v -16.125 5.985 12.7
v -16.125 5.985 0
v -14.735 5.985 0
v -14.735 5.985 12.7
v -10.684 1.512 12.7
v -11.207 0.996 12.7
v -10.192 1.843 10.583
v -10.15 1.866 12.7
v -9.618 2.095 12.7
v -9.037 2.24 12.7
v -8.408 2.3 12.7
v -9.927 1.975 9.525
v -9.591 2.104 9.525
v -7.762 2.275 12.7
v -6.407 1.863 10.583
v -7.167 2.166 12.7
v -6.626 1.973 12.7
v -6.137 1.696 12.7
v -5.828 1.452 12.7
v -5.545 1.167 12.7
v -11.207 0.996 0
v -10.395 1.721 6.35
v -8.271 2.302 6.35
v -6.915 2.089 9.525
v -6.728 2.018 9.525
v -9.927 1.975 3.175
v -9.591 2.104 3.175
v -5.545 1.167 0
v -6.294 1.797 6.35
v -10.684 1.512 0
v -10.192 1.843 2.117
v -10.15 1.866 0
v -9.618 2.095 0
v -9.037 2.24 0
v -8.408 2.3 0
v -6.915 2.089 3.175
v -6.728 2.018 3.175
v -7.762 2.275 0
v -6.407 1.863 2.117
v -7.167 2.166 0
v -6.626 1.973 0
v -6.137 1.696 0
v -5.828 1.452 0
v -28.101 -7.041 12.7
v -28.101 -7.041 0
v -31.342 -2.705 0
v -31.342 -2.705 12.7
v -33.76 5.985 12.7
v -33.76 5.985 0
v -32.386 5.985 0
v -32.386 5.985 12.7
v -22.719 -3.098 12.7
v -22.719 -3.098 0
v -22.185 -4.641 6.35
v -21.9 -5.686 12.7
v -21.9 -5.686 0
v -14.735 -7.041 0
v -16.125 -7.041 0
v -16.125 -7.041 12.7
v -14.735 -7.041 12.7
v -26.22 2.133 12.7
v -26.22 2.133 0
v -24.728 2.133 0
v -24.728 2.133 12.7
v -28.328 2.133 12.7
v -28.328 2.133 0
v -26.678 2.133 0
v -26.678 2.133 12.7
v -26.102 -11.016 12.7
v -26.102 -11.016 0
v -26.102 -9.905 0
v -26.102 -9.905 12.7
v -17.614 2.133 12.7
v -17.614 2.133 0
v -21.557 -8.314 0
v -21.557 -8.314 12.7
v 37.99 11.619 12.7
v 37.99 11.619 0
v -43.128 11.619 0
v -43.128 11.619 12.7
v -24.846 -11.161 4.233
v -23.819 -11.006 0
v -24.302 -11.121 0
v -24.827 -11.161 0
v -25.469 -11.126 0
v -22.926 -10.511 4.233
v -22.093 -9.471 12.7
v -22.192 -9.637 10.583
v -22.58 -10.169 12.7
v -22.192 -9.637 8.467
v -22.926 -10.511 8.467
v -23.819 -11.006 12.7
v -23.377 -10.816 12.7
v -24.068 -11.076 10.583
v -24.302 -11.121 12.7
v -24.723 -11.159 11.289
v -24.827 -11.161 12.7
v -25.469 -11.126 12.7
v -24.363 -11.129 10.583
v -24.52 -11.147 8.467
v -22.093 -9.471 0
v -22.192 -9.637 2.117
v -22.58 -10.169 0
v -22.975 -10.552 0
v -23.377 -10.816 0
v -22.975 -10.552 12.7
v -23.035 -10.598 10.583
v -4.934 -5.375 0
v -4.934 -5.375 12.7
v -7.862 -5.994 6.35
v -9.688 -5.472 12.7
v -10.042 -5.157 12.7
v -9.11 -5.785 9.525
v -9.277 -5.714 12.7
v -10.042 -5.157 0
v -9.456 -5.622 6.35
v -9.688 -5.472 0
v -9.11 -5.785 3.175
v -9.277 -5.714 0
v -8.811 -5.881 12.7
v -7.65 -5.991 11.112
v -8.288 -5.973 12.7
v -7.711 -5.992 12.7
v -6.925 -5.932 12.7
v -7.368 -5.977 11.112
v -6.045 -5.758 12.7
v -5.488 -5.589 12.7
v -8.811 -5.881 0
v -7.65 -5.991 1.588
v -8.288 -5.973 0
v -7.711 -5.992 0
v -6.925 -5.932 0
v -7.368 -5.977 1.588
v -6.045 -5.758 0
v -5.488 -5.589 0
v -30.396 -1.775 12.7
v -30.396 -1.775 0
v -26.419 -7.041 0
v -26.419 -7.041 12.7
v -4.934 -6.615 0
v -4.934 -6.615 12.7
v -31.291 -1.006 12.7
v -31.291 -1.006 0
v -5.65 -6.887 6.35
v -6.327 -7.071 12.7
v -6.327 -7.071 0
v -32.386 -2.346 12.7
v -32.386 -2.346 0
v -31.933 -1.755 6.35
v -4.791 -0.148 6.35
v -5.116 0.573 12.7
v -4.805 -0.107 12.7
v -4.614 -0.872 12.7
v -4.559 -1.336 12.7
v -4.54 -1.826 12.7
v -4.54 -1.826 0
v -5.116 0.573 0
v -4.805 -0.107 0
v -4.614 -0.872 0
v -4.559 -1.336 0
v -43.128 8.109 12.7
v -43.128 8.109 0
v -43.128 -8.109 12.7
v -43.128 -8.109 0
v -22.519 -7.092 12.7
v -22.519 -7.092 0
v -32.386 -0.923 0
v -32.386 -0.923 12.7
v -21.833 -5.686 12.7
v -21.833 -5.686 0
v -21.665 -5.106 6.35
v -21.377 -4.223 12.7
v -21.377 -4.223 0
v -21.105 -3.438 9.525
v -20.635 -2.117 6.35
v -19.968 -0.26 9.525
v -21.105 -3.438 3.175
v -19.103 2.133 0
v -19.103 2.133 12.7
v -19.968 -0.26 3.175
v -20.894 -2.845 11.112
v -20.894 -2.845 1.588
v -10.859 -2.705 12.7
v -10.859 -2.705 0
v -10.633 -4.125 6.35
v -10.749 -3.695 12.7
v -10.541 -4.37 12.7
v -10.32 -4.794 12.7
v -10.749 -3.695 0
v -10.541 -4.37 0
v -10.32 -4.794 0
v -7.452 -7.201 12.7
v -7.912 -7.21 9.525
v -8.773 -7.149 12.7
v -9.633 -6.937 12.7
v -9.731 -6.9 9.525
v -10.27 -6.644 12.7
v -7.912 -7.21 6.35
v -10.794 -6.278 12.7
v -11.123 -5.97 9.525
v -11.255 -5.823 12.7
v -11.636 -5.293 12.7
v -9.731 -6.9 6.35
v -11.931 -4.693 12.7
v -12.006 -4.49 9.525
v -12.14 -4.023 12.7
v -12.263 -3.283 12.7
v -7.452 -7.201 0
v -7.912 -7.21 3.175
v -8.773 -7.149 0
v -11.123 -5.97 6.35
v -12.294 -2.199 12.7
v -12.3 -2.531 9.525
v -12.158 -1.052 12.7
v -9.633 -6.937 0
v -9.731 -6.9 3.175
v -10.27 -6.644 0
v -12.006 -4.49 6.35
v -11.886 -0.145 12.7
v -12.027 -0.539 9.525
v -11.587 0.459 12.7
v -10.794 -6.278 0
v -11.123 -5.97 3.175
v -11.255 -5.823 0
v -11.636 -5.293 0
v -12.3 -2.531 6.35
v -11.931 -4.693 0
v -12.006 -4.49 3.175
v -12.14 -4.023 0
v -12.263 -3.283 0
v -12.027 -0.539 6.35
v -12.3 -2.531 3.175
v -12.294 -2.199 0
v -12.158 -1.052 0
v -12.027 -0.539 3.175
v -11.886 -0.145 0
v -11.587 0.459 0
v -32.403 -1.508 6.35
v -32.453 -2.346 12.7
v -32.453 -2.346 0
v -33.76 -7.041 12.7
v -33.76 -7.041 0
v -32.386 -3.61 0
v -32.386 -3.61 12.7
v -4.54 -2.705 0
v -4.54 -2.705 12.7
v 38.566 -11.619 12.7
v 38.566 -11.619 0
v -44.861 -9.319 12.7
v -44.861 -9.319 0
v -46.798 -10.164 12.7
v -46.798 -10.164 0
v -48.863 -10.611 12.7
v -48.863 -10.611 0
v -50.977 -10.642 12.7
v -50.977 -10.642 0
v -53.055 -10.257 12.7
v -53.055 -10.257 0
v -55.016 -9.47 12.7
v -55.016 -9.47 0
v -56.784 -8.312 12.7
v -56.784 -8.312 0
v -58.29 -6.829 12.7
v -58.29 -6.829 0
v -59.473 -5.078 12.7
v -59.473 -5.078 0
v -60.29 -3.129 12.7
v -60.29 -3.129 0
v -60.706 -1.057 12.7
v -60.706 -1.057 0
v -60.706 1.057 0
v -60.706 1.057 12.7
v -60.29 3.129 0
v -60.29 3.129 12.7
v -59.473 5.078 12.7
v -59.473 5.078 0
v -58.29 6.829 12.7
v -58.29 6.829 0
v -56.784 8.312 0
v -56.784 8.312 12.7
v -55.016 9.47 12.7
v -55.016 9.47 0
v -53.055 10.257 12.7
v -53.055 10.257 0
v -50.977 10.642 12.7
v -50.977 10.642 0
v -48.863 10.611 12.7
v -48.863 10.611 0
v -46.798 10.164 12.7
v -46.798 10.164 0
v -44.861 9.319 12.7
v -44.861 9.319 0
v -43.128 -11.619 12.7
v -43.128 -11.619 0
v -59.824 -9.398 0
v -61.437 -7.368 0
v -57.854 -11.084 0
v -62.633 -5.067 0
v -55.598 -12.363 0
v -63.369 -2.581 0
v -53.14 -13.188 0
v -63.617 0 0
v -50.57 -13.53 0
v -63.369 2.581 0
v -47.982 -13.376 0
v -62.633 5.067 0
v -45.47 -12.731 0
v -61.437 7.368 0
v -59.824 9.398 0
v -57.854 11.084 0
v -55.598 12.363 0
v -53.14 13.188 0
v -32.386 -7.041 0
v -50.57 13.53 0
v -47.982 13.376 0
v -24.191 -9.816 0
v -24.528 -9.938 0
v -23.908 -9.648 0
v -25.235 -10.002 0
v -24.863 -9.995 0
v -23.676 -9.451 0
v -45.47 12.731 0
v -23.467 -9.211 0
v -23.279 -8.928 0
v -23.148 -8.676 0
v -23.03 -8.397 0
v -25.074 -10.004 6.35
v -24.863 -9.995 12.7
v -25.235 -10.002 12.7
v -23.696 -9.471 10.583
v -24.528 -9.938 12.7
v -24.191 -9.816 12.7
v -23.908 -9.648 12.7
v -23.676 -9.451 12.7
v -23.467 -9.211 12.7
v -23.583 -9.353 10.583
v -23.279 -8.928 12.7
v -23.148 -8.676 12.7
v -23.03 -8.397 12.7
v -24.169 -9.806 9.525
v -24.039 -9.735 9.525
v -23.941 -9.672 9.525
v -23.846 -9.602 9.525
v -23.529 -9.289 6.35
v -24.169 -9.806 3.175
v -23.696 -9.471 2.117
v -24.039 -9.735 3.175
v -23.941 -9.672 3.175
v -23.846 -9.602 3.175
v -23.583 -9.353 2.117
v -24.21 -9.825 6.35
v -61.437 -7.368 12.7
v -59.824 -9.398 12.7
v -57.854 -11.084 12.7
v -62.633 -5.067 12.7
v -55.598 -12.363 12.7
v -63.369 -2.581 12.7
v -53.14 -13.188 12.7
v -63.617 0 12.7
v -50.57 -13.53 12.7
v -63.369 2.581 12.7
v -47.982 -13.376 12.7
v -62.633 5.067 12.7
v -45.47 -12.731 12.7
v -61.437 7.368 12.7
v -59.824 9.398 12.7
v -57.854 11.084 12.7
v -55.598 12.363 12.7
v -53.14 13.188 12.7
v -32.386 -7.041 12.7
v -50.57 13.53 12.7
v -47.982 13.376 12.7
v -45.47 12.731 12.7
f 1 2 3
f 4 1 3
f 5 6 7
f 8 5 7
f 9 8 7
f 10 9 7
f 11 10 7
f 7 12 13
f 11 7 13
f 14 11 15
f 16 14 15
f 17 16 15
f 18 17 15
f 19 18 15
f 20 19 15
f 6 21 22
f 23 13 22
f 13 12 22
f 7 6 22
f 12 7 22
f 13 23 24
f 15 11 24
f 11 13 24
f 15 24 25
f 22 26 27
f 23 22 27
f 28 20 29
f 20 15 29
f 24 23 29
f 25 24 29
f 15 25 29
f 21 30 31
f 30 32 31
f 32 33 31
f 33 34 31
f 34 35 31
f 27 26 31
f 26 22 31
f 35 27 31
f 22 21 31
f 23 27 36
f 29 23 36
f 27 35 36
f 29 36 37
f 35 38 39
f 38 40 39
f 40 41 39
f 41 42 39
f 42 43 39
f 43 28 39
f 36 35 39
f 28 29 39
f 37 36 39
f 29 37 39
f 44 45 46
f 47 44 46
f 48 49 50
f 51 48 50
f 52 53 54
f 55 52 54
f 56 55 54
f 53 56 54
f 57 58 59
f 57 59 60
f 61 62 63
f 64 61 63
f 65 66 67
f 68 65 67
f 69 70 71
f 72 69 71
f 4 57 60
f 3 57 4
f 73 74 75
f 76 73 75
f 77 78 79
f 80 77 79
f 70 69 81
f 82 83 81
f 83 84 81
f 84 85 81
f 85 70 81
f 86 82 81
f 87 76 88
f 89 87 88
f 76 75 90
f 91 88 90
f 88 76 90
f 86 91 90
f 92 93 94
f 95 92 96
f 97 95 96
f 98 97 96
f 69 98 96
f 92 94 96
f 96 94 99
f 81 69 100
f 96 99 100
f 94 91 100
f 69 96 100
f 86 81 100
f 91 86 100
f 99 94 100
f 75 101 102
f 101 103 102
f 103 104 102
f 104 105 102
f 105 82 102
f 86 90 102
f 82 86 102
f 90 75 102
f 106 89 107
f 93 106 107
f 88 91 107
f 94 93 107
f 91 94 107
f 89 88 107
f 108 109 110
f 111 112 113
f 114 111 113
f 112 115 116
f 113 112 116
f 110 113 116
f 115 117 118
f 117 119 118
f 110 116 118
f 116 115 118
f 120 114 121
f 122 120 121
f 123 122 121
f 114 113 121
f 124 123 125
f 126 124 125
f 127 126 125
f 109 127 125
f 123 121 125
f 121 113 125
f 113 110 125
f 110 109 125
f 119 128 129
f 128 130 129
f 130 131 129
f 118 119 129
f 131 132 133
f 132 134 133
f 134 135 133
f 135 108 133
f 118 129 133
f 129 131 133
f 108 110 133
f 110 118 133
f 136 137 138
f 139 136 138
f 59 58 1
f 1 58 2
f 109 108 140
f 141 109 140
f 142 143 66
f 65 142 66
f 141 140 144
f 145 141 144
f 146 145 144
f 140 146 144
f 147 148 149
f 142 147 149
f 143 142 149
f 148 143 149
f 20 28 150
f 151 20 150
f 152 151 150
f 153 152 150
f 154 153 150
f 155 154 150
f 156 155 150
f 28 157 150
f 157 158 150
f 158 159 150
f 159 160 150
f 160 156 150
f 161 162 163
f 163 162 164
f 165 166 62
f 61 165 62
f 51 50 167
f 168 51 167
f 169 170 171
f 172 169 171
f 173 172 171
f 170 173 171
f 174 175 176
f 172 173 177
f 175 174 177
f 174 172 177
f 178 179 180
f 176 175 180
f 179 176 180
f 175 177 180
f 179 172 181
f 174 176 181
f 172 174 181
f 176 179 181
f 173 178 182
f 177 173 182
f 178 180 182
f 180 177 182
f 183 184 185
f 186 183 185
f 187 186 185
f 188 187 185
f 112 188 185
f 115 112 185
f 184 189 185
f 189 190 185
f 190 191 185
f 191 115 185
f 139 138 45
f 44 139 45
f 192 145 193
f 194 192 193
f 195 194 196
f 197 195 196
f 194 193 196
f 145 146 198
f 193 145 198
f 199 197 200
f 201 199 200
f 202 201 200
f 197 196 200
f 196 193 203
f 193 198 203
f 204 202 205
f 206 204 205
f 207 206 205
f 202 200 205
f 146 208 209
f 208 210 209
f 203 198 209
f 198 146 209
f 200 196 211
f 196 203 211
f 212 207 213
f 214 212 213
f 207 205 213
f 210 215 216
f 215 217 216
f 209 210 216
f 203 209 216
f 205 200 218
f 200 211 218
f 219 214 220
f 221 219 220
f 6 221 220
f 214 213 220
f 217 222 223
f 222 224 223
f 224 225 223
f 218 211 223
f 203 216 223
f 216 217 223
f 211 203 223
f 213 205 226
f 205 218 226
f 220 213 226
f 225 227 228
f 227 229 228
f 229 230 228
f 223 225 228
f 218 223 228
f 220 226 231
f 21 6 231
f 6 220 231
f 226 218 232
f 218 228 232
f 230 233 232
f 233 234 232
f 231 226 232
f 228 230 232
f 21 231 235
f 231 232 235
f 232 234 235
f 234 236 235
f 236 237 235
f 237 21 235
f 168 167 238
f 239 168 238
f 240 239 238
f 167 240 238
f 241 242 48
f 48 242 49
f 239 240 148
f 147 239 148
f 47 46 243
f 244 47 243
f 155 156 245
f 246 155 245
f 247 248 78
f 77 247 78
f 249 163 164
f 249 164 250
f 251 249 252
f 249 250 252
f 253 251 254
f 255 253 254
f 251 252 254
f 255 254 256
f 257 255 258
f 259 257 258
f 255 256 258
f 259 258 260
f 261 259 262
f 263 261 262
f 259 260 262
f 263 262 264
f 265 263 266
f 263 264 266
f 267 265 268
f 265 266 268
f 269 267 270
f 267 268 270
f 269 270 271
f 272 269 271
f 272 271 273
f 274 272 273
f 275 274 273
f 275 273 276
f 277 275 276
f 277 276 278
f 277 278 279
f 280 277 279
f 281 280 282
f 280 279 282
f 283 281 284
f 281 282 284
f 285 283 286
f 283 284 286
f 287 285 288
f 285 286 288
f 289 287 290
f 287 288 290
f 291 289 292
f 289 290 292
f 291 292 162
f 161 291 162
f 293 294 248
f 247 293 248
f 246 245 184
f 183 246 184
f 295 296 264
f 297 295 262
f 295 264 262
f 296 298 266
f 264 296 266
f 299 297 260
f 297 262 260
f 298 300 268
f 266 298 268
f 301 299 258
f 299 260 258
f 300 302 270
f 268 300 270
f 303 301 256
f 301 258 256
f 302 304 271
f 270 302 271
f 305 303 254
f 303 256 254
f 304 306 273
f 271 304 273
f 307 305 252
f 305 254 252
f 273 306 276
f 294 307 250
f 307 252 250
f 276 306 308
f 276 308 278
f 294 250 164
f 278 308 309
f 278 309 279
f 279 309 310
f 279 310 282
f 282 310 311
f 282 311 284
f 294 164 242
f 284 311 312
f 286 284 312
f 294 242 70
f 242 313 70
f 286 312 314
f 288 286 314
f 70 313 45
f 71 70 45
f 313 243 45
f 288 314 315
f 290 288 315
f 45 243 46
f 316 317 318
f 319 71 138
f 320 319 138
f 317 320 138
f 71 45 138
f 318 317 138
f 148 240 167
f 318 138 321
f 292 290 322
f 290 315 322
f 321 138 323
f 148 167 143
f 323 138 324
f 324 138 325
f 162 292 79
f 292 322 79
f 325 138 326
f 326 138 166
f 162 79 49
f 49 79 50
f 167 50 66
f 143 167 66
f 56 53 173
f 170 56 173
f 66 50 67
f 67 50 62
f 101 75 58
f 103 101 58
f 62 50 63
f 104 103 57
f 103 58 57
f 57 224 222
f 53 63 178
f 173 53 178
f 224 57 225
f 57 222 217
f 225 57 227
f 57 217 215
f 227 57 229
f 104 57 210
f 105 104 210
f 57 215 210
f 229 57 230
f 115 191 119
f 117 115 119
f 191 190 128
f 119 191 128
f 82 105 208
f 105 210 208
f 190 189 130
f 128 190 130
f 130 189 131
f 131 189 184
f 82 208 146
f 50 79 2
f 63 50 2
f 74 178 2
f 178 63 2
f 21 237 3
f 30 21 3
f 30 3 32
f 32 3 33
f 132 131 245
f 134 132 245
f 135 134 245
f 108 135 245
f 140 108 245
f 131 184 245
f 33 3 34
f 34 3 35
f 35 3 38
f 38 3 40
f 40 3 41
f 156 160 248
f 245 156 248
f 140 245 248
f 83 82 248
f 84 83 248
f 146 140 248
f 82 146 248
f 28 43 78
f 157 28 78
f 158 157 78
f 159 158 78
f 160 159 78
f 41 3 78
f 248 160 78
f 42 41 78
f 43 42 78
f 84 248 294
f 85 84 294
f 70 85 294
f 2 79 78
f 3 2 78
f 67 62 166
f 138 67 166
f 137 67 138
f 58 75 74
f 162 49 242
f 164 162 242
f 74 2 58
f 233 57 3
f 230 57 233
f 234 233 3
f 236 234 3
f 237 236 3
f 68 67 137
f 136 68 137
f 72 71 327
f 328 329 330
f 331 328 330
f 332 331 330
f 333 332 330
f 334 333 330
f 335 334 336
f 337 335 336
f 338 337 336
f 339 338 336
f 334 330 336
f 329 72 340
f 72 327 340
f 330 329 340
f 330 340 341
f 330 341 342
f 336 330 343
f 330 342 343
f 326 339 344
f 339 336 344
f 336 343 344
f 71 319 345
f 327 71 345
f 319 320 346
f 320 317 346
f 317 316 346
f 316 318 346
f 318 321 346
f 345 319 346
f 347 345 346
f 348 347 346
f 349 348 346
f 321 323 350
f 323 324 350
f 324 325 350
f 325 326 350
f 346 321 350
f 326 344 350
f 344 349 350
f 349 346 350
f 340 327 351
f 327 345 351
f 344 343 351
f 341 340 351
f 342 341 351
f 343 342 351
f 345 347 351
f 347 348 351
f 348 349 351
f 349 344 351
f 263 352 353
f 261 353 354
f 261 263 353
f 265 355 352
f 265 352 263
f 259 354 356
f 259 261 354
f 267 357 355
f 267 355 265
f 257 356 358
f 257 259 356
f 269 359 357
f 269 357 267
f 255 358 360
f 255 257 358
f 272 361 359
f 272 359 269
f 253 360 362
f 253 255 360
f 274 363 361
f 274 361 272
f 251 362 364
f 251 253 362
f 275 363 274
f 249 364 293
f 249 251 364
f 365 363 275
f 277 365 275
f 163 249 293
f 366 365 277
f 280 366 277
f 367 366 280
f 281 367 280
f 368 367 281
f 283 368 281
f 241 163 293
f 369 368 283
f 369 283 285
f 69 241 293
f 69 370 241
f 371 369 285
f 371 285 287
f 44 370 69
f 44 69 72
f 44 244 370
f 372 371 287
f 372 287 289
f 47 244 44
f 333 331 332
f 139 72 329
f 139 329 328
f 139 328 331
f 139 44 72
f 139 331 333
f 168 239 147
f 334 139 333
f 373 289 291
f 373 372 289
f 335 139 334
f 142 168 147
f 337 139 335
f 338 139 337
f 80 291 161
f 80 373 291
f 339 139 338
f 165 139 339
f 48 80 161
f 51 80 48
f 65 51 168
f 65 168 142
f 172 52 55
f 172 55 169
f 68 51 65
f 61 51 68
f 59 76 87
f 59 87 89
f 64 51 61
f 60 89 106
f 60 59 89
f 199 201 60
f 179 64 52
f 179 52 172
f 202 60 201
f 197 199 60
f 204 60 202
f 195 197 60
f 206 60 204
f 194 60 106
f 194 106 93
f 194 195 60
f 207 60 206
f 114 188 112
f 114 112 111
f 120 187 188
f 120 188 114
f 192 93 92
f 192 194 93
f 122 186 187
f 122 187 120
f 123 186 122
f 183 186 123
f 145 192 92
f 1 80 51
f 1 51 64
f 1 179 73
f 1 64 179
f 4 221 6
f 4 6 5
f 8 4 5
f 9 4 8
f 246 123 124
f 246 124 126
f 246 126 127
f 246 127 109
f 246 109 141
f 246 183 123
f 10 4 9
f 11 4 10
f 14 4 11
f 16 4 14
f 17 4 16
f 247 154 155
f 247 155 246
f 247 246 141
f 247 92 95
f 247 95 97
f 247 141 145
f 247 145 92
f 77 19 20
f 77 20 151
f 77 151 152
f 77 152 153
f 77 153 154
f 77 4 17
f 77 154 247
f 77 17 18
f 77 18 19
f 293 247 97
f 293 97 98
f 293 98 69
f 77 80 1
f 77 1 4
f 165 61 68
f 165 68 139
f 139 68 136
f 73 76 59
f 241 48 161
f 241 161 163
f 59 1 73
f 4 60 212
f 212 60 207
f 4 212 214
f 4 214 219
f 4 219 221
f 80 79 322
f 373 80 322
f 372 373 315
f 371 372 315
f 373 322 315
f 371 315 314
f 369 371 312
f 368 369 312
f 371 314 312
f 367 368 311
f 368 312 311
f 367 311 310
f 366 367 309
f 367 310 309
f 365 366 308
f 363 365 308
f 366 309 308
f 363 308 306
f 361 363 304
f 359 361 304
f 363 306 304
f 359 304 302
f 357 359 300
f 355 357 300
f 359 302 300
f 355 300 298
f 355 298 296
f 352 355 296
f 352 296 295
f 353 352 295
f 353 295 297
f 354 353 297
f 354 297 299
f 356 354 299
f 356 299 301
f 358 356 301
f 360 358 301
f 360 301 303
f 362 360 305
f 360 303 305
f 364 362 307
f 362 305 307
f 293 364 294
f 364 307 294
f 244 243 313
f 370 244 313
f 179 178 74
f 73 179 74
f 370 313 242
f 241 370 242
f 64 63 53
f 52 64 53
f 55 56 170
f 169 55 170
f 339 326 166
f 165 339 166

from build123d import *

# Parameters (mm, degrees)
F0_W     = 1.390167144
F0_H     = 13.0257857824
F1_DEPTH = 12.7


with BuildPart() as f1:
    # F0 (on Top) → F1 (new body)
    with BuildSketch(Plane.XY):
        with BuildLine():
            Line((-43.1278555505, 8.1087965258), (-43.1278555505, 11.6189617885))
            ThreePointArc((-43.1278555505, 11.6189617885), (-63.6173153539, 0), (-43.1278555505, -11.6189617885))
            Line((-43.1278555505, -11.6189617885), (-43.1278555505, -8.1087965258))
            ThreePointArc((-43.1278555505, -8.1087965258), (-60.7580848758, 0), (-43.1278555505, 8.1087965258))
        make_face()
        Polygon((37.9903619809, 11.6189617885), (-43.1278555505, 11.6189617885), (-43.1278555505, 8.1087965258), (-43.1278555505, -8.1087965258), (-43.1278555505, -11.6189617885), (38.5659746826, -11.6189617885), align=None)
        with BuildLine():
            Line((-22.5185390528, -7.0921576955), (-26.2202943379, 2.1327664737))
            Line((-26.2202943379, 2.1327664737), (-24.7283423163, 2.1327664737))
            Line((-24.7283423163, 2.1327664737), (-22.7194302586, -3.0984405247))
            add(Edge.make_bspline(
                [(-22.7194302586, -3.0984405247), (-22.0605071037, -4.8903900802), (-21.899794139, -5.6859192551)],
                knots=[0, 0, 0, 1, 1, 1], degree=2))
            Line((-21.899794139, -5.6859192551), (-21.8328304038, -5.6859192551))
            add(Edge.make_bspline(
                [(-21.8328304038, -5.6859192551), (-21.7256884274, -5.2573513494), (-21.377477004, -4.223431277)],
                knots=[0, 0, 0, 1, 1, 1], degree=2))
            add(Edge.make_bspline(
                [(-21.377477004, -4.223431277), (-21.0292655807, -3.1895112047), (-19.1033885547, 2.1327664737)],
                knots=[0, 0, 0, 1, 1, 1], degree=2))
            Line((-19.1033885547, 2.1327664737), (-17.6141150825, 2.1327664737))
            Line((-17.6141150825, 2.1327664737), (-21.5569398145, -8.3135762266))
            add(Edge.make_bspline(
                [(-21.5569398145, -8.3135762266), (-22.1435421354, -9.8617777858), (-22.9256785632, -10.5113260178)],
                knots=[0, 0, 0, 1, 1, 1], degree=2))
            add(Edge.make_bspline(
                [(-22.9256785632, -10.5113260178), (-23.707814991, -11.1608742498), (-24.8461984904, -11.1608742498)],
                knots=[0, 0, 0, 1, 1, 1], degree=2))
            add(Edge.make_bspline(
                [(-24.8461984904, -11.1608742498), (-25.4836932501, -11.1608742498), (-26.1024381638, -11.0162325816)],
                knots=[0, 0, 0, 1, 1, 1], degree=2))
            Line((-26.1024381638, -11.0162325816), (-26.1024381638, -9.9046345763))
            add(Edge.make_bspline(
                [(-26.1024381638, -9.9046345763), (-25.6417276653, -10.0037409045), (-25.0738751903, -10.0037409045)],
                knots=[0, 0, 0, 1, 1, 1], degree=2))
            add(Edge.make_bspline(
                [(-25.0738751903, -10.0037409045), (-23.6408512558, -10.0037409045), (-23.0301419902, -8.3966112583)],
                knots=[0, 0, 0, 1, 1, 1], degree=2))
            Line((-23.0301419902, -8.3966112583), (-22.5185390528, -7.0921576955))
        make_face(mode=Mode.SUBTRACT)
        with BuildLine():
            Line((-32.4532788157, -2.3457681404), (-32.3863150805, -2.3457681404))
            add(Edge.make_bspline(
                [(-32.3863150805, -2.3457681404), (-32.0273894595, -1.834165203), (-31.2907883716, -1.0064934352)],
                knots=[0, 0, 0, 1, 1, 1], degree=2))
            Line((-31.2907883716, -1.0064934352), (-28.3283127238, 2.1327664737))
            Line((-28.3283127238, 2.1327664737), (-26.6783262871, 2.1327664737))
            Line((-26.6783262871, 2.1327664737), (-30.3961528686, -1.775237116))
            Line((-30.3961528686, -1.775237116), (-26.4185069943, -7.0412652567))
            Line((-26.4185069943, -7.0412652567), (-28.1006360239, -7.0412652567))
            Line((-28.1006360239, -7.0412652567), (-31.3416808104, -2.7046937614))
            Line((-31.3416808104, -2.7046937614), (-32.3863150805, -3.6100434621))
            Line((-32.3863150805, -3.6100434621), (-32.3863150805, -7.0412652567))
            Line((-32.3863150805, -7.0412652567), (-33.760410928, -7.0412652567))
            Line((-33.760410928, -7.0412652567), (-33.760410928, 5.9845205257))
            Line((-33.760410928, 5.9845205257), (-32.3863150805, 5.9845205257))
            Line((-32.3863150805, 5.9845205257), (-32.3863150805, -0.9234584035))
            add(Edge.make_bspline(
                [(-32.3863150805, -0.9234584035), (-32.3863150805, -1.3814903527), (-32.4532788157, -2.3457681404)],
                knots=[0, 0, 0, 1, 1, 1], degree=2))
        make_face(mode=Mode.SUBTRACT)
        with Locations((-15.4297580384, -0.5283723655)):
            Rectangle(F0_W, F0_H, mode=Mode.SUBTRACT)
        with BuildLine():
            add(Edge.make_bspline(
                [(-6.3267078674, -7.0707293002), (-6.982952473, -7.2100138696), (-7.9124091183, -7.2100138696)],
                knots=[0, 0, 0, 1, 1, 1], degree=2))
            add(Edge.make_bspline(
                [(-7.9124091183, -7.2100138696), (-9.9454281208, -7.2100138696), (-11.1226505866, -5.9698454926)],
                knots=[0, 0, 0, 1, 1, 1], degree=2))
            add(Edge.make_bspline(
                [(-11.1226505866, -5.9698454926), (-12.2998730524, -4.7296771156), (-12.2998730524, -2.5305880497)],
                knots=[0, 0, 0, 1, 1, 1], degree=2))
            add(Edge.make_bspline(
                [(-12.2998730524, -2.5305880497), (-12.2998730524, -0.3100705886), (-11.207024893, 0.995722249)],
                knots=[0, 0, 0, 1, 1, 1], degree=2))
            add(Edge.make_bspline(
                [(-11.207024893, 0.995722249), (-10.1141767336, 2.3015150865), (-8.2713347393, 2.3015150865)],
                knots=[0, 0, 0, 1, 1, 1], degree=2))
            add(Edge.make_bspline(
                [(-8.2713347393, 2.3015150865), (-6.5490274685, 2.3015150865), (-5.5445714396, 1.1671494112)],
                knots=[0, 0, 0, 1, 1, 1], degree=2))
            add(Edge.make_bspline(
                [(-5.5445714396, 1.1671494112), (-4.5401154107, 0.032783736), (-4.5401154107, -1.8261295548)],
                knots=[0, 0, 0, 1, 1, 1], degree=2))
            Line((-4.5401154107, -1.8261295548), (-4.5401154107, -2.7046937614))
            Line((-4.5401154107, -2.7046937614), (-10.8588134697, -2.7046937614))
            add(Edge.make_bspline(
                [(-10.8588134697, -2.7046937614), (-10.8159566791, -4.3198590558), (-10.0418558995, -5.1569057465)],
                knots=[0, 0, 0, 1, 1, 1], degree=2))
            add(Edge.make_bspline(
                [(-10.0418558995, -5.1569057465), (-9.26775512, -5.9939524373), (-7.8615166795, -5.9939524373)],
                knots=[0, 0, 0, 1, 1, 1], degree=2))
            add(Edge.make_bspline(
                [(-7.8615166795, -5.9939524373), (-6.3802788556, -5.9939524373), (-4.9338621741, -5.3752075235)],
                knots=[0, 0, 0, 1, 1, 1], degree=2))
            Line((-4.9338621741, -5.3752075235), (-4.9338621741, -6.6153759005))
            add(Edge.make_bspline(
                [(-4.9338621741, -6.6153759005), (-5.6704632619, -6.9314447309), (-6.3267078674, -7.0707293002)],
                knots=[0, 0, 0, 1, 1, 1], degree=2))
        make_face(mode=Mode.SUBTRACT)
    extrude(amount=F1_DEPTH)


solid = f1.part
